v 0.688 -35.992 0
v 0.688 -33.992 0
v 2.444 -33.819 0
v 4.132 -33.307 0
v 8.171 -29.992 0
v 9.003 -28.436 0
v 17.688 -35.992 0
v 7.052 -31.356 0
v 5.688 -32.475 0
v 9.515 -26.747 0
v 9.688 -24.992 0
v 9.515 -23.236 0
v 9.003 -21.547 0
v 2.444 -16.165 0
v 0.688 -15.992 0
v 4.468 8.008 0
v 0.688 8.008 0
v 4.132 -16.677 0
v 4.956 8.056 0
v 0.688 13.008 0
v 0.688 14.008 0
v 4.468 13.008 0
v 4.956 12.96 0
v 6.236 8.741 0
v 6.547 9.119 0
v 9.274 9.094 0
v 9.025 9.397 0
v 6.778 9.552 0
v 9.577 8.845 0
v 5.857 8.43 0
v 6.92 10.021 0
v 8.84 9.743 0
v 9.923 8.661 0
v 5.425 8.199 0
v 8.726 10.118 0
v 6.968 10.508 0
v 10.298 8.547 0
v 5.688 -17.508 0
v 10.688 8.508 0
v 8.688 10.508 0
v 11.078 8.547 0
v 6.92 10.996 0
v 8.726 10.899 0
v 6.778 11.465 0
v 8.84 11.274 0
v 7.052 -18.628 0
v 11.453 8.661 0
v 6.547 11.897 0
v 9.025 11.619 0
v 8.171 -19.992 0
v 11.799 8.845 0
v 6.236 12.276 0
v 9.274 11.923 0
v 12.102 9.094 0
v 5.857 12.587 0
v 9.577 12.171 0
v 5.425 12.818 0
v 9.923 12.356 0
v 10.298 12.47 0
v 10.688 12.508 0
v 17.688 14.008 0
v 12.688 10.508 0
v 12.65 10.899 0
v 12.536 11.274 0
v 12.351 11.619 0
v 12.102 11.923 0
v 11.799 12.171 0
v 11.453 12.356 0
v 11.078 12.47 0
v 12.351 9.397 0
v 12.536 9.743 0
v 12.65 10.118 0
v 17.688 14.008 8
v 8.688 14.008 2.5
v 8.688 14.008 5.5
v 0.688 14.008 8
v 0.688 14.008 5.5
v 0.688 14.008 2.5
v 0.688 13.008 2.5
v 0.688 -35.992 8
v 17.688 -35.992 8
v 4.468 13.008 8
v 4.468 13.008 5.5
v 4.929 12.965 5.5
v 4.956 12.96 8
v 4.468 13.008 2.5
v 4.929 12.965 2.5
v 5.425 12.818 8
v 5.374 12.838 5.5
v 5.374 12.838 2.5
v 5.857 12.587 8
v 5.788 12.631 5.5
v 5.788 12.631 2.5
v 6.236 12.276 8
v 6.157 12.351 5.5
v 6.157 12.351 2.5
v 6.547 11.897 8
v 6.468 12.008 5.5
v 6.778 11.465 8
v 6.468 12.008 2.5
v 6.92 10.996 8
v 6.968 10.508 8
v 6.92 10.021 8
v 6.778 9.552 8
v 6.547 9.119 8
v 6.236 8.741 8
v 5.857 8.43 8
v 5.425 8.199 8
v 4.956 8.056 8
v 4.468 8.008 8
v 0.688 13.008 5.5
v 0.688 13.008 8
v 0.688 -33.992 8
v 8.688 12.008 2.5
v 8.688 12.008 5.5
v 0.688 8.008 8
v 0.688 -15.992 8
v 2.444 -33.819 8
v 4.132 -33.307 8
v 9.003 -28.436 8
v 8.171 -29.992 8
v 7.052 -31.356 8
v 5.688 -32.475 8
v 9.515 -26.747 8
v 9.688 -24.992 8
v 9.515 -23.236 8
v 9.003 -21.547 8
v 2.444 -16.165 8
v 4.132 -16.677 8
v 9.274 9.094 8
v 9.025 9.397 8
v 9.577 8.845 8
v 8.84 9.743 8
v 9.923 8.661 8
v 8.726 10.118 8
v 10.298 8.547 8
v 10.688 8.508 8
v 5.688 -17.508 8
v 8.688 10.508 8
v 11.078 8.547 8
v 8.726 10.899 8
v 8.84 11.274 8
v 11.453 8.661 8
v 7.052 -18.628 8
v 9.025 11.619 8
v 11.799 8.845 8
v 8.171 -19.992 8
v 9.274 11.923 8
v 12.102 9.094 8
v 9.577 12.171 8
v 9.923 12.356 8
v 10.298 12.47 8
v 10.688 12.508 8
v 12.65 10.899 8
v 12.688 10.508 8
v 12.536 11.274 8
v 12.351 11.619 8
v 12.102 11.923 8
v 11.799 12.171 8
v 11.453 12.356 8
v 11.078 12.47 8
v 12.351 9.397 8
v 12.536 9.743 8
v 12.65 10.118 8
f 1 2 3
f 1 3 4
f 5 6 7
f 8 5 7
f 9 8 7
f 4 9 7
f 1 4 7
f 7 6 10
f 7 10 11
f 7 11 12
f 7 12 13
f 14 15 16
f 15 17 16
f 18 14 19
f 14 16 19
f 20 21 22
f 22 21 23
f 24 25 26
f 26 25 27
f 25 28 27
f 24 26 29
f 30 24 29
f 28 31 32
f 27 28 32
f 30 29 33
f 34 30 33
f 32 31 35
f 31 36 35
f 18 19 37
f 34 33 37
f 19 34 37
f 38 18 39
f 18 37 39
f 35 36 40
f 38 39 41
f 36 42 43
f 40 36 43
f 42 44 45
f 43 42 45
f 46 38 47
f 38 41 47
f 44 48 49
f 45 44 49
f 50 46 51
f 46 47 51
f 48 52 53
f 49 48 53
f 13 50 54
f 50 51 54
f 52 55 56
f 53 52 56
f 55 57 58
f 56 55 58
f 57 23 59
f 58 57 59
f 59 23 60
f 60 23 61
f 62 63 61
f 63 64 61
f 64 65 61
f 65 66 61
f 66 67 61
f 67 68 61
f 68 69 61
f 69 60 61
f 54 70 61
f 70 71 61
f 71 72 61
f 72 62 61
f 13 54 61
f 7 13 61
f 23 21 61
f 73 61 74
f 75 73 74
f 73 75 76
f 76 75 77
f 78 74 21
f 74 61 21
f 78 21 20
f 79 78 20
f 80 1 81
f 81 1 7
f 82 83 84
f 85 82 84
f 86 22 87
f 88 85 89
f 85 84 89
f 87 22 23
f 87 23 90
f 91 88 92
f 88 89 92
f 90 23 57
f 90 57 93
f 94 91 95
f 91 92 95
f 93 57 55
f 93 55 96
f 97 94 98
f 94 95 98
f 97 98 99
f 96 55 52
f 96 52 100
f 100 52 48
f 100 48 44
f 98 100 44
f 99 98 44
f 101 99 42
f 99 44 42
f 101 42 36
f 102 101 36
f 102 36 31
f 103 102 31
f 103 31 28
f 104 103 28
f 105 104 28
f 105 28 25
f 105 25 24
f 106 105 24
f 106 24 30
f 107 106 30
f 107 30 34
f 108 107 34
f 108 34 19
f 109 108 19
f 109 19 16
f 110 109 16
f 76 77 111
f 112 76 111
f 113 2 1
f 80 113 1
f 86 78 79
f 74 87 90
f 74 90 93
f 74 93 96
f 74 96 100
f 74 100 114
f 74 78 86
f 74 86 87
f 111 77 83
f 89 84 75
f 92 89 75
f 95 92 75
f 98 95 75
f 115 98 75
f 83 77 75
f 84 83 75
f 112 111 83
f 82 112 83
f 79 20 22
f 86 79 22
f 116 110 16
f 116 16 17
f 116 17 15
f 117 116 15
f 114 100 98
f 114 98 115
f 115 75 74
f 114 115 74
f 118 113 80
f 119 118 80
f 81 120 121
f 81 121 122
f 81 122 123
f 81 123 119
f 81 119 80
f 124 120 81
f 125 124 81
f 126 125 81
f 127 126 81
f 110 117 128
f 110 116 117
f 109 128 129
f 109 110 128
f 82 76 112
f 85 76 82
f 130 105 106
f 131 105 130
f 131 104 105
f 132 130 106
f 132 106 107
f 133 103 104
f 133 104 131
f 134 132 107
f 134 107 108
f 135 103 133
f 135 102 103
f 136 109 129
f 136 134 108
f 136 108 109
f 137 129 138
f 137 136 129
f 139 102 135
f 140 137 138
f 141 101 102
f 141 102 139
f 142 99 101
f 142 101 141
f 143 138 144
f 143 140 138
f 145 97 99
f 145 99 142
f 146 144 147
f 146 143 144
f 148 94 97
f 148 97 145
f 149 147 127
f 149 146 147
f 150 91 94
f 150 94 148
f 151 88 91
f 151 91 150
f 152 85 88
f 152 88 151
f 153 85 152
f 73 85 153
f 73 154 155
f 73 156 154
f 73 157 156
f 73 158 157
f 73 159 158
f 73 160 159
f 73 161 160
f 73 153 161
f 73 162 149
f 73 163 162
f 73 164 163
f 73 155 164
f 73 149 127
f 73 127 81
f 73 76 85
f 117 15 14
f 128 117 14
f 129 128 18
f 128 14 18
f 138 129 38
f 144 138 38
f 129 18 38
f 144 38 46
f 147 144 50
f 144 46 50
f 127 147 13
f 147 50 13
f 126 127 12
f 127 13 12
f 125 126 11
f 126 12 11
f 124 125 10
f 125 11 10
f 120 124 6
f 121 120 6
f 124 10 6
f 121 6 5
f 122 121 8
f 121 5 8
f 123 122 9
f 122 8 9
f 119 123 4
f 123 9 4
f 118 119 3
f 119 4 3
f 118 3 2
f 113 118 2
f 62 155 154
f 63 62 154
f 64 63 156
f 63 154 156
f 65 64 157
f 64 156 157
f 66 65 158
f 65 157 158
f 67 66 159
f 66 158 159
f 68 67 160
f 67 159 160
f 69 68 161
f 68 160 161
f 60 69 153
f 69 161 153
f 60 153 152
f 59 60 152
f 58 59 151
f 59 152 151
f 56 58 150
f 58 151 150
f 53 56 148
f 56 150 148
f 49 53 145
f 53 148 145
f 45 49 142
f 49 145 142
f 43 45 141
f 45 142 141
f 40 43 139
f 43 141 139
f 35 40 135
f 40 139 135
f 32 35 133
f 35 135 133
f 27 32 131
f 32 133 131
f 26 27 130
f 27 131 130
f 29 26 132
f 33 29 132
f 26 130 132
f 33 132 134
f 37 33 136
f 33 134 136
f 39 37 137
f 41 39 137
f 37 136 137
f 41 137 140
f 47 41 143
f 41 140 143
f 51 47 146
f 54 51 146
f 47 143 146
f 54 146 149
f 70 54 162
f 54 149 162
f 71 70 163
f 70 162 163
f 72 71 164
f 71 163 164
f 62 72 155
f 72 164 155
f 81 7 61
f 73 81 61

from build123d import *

# Parameters (mm, degrees)
BOSS_EXTRUDE1_DEPTH = 8
SKETCH2_R           = 2
CUT_EXTRUDE1_DEPTH  = 8
SKETCH3_W           = 8
SKETCH3_H           = 3
CUT_EXTRUDE2_DEPTH  = 2


with BuildPart() as part:
    # Sketch1 → Boss-Extrude1 (new body)
    with BuildSketch(Plane.XY):
        with BuildLine():
            Line((0.688022284, 7.008356546), (0.688022284, -15.991643454))
            ThreePointArc((0.688022284, -15.991643454), (9.688022284, -24.991643454), (0.688022284, -33.991643454))
            Line((0.688022284, -33.991643454), (0.688022284, -35.991643454))
            Line((0.688022284, -35.991643454), (17.688022284, -35.991643454))
            Line((17.688022284, -35.991643454), (17.688022284, 14.008356546))
            Line((17.688022284, 14.008356546), (0.688022284, 14.008356546))
            Line((0.688022284, 14.008356546), (0.688022284, 13.008356546))
            Line((0.688022284, 13.008356546), (4.46794824, 13.008356546))
            ThreePointArc((4.46794824, 13.008356546), (6.96794824, 10.508356546), (4.46794824, 8.008356546))
            Line((4.46794824, 8.008356546), (0.688022284, 8.008356546))
            Line((0.688022284, 8.008356546), (0.688022284, 7.008356546))
        make_face()
    extrude(amount=BOSS_EXTRUDE1_DEPTH)

    # Sketch2 → Cut-Extrude1 (cut)
    with BuildSketch(Plane.XY.offset(8)):
        with Locations((10.688022284, 10.508356546)):
            Circle(SKETCH2_R)
    extrude(amount=-CUT_EXTRUDE1_DEPTH, mode=Mode.SUBTRACT)

    # Sketch3 → Cut-Extrude2 (cut)
    with BuildSketch(Plane(origin=(0, 14.008356546, 0), x_dir=(1, 0, 0), z_dir=(0, 1, 0))):
        with Locations((4.688022284, -4)):
            Rectangle(SKETCH3_W, SKETCH3_H)
    extrude(amount=-CUT_EXTRUDE2_DEPTH, mode=Mode.SUBTRACT)


solid = part.part
